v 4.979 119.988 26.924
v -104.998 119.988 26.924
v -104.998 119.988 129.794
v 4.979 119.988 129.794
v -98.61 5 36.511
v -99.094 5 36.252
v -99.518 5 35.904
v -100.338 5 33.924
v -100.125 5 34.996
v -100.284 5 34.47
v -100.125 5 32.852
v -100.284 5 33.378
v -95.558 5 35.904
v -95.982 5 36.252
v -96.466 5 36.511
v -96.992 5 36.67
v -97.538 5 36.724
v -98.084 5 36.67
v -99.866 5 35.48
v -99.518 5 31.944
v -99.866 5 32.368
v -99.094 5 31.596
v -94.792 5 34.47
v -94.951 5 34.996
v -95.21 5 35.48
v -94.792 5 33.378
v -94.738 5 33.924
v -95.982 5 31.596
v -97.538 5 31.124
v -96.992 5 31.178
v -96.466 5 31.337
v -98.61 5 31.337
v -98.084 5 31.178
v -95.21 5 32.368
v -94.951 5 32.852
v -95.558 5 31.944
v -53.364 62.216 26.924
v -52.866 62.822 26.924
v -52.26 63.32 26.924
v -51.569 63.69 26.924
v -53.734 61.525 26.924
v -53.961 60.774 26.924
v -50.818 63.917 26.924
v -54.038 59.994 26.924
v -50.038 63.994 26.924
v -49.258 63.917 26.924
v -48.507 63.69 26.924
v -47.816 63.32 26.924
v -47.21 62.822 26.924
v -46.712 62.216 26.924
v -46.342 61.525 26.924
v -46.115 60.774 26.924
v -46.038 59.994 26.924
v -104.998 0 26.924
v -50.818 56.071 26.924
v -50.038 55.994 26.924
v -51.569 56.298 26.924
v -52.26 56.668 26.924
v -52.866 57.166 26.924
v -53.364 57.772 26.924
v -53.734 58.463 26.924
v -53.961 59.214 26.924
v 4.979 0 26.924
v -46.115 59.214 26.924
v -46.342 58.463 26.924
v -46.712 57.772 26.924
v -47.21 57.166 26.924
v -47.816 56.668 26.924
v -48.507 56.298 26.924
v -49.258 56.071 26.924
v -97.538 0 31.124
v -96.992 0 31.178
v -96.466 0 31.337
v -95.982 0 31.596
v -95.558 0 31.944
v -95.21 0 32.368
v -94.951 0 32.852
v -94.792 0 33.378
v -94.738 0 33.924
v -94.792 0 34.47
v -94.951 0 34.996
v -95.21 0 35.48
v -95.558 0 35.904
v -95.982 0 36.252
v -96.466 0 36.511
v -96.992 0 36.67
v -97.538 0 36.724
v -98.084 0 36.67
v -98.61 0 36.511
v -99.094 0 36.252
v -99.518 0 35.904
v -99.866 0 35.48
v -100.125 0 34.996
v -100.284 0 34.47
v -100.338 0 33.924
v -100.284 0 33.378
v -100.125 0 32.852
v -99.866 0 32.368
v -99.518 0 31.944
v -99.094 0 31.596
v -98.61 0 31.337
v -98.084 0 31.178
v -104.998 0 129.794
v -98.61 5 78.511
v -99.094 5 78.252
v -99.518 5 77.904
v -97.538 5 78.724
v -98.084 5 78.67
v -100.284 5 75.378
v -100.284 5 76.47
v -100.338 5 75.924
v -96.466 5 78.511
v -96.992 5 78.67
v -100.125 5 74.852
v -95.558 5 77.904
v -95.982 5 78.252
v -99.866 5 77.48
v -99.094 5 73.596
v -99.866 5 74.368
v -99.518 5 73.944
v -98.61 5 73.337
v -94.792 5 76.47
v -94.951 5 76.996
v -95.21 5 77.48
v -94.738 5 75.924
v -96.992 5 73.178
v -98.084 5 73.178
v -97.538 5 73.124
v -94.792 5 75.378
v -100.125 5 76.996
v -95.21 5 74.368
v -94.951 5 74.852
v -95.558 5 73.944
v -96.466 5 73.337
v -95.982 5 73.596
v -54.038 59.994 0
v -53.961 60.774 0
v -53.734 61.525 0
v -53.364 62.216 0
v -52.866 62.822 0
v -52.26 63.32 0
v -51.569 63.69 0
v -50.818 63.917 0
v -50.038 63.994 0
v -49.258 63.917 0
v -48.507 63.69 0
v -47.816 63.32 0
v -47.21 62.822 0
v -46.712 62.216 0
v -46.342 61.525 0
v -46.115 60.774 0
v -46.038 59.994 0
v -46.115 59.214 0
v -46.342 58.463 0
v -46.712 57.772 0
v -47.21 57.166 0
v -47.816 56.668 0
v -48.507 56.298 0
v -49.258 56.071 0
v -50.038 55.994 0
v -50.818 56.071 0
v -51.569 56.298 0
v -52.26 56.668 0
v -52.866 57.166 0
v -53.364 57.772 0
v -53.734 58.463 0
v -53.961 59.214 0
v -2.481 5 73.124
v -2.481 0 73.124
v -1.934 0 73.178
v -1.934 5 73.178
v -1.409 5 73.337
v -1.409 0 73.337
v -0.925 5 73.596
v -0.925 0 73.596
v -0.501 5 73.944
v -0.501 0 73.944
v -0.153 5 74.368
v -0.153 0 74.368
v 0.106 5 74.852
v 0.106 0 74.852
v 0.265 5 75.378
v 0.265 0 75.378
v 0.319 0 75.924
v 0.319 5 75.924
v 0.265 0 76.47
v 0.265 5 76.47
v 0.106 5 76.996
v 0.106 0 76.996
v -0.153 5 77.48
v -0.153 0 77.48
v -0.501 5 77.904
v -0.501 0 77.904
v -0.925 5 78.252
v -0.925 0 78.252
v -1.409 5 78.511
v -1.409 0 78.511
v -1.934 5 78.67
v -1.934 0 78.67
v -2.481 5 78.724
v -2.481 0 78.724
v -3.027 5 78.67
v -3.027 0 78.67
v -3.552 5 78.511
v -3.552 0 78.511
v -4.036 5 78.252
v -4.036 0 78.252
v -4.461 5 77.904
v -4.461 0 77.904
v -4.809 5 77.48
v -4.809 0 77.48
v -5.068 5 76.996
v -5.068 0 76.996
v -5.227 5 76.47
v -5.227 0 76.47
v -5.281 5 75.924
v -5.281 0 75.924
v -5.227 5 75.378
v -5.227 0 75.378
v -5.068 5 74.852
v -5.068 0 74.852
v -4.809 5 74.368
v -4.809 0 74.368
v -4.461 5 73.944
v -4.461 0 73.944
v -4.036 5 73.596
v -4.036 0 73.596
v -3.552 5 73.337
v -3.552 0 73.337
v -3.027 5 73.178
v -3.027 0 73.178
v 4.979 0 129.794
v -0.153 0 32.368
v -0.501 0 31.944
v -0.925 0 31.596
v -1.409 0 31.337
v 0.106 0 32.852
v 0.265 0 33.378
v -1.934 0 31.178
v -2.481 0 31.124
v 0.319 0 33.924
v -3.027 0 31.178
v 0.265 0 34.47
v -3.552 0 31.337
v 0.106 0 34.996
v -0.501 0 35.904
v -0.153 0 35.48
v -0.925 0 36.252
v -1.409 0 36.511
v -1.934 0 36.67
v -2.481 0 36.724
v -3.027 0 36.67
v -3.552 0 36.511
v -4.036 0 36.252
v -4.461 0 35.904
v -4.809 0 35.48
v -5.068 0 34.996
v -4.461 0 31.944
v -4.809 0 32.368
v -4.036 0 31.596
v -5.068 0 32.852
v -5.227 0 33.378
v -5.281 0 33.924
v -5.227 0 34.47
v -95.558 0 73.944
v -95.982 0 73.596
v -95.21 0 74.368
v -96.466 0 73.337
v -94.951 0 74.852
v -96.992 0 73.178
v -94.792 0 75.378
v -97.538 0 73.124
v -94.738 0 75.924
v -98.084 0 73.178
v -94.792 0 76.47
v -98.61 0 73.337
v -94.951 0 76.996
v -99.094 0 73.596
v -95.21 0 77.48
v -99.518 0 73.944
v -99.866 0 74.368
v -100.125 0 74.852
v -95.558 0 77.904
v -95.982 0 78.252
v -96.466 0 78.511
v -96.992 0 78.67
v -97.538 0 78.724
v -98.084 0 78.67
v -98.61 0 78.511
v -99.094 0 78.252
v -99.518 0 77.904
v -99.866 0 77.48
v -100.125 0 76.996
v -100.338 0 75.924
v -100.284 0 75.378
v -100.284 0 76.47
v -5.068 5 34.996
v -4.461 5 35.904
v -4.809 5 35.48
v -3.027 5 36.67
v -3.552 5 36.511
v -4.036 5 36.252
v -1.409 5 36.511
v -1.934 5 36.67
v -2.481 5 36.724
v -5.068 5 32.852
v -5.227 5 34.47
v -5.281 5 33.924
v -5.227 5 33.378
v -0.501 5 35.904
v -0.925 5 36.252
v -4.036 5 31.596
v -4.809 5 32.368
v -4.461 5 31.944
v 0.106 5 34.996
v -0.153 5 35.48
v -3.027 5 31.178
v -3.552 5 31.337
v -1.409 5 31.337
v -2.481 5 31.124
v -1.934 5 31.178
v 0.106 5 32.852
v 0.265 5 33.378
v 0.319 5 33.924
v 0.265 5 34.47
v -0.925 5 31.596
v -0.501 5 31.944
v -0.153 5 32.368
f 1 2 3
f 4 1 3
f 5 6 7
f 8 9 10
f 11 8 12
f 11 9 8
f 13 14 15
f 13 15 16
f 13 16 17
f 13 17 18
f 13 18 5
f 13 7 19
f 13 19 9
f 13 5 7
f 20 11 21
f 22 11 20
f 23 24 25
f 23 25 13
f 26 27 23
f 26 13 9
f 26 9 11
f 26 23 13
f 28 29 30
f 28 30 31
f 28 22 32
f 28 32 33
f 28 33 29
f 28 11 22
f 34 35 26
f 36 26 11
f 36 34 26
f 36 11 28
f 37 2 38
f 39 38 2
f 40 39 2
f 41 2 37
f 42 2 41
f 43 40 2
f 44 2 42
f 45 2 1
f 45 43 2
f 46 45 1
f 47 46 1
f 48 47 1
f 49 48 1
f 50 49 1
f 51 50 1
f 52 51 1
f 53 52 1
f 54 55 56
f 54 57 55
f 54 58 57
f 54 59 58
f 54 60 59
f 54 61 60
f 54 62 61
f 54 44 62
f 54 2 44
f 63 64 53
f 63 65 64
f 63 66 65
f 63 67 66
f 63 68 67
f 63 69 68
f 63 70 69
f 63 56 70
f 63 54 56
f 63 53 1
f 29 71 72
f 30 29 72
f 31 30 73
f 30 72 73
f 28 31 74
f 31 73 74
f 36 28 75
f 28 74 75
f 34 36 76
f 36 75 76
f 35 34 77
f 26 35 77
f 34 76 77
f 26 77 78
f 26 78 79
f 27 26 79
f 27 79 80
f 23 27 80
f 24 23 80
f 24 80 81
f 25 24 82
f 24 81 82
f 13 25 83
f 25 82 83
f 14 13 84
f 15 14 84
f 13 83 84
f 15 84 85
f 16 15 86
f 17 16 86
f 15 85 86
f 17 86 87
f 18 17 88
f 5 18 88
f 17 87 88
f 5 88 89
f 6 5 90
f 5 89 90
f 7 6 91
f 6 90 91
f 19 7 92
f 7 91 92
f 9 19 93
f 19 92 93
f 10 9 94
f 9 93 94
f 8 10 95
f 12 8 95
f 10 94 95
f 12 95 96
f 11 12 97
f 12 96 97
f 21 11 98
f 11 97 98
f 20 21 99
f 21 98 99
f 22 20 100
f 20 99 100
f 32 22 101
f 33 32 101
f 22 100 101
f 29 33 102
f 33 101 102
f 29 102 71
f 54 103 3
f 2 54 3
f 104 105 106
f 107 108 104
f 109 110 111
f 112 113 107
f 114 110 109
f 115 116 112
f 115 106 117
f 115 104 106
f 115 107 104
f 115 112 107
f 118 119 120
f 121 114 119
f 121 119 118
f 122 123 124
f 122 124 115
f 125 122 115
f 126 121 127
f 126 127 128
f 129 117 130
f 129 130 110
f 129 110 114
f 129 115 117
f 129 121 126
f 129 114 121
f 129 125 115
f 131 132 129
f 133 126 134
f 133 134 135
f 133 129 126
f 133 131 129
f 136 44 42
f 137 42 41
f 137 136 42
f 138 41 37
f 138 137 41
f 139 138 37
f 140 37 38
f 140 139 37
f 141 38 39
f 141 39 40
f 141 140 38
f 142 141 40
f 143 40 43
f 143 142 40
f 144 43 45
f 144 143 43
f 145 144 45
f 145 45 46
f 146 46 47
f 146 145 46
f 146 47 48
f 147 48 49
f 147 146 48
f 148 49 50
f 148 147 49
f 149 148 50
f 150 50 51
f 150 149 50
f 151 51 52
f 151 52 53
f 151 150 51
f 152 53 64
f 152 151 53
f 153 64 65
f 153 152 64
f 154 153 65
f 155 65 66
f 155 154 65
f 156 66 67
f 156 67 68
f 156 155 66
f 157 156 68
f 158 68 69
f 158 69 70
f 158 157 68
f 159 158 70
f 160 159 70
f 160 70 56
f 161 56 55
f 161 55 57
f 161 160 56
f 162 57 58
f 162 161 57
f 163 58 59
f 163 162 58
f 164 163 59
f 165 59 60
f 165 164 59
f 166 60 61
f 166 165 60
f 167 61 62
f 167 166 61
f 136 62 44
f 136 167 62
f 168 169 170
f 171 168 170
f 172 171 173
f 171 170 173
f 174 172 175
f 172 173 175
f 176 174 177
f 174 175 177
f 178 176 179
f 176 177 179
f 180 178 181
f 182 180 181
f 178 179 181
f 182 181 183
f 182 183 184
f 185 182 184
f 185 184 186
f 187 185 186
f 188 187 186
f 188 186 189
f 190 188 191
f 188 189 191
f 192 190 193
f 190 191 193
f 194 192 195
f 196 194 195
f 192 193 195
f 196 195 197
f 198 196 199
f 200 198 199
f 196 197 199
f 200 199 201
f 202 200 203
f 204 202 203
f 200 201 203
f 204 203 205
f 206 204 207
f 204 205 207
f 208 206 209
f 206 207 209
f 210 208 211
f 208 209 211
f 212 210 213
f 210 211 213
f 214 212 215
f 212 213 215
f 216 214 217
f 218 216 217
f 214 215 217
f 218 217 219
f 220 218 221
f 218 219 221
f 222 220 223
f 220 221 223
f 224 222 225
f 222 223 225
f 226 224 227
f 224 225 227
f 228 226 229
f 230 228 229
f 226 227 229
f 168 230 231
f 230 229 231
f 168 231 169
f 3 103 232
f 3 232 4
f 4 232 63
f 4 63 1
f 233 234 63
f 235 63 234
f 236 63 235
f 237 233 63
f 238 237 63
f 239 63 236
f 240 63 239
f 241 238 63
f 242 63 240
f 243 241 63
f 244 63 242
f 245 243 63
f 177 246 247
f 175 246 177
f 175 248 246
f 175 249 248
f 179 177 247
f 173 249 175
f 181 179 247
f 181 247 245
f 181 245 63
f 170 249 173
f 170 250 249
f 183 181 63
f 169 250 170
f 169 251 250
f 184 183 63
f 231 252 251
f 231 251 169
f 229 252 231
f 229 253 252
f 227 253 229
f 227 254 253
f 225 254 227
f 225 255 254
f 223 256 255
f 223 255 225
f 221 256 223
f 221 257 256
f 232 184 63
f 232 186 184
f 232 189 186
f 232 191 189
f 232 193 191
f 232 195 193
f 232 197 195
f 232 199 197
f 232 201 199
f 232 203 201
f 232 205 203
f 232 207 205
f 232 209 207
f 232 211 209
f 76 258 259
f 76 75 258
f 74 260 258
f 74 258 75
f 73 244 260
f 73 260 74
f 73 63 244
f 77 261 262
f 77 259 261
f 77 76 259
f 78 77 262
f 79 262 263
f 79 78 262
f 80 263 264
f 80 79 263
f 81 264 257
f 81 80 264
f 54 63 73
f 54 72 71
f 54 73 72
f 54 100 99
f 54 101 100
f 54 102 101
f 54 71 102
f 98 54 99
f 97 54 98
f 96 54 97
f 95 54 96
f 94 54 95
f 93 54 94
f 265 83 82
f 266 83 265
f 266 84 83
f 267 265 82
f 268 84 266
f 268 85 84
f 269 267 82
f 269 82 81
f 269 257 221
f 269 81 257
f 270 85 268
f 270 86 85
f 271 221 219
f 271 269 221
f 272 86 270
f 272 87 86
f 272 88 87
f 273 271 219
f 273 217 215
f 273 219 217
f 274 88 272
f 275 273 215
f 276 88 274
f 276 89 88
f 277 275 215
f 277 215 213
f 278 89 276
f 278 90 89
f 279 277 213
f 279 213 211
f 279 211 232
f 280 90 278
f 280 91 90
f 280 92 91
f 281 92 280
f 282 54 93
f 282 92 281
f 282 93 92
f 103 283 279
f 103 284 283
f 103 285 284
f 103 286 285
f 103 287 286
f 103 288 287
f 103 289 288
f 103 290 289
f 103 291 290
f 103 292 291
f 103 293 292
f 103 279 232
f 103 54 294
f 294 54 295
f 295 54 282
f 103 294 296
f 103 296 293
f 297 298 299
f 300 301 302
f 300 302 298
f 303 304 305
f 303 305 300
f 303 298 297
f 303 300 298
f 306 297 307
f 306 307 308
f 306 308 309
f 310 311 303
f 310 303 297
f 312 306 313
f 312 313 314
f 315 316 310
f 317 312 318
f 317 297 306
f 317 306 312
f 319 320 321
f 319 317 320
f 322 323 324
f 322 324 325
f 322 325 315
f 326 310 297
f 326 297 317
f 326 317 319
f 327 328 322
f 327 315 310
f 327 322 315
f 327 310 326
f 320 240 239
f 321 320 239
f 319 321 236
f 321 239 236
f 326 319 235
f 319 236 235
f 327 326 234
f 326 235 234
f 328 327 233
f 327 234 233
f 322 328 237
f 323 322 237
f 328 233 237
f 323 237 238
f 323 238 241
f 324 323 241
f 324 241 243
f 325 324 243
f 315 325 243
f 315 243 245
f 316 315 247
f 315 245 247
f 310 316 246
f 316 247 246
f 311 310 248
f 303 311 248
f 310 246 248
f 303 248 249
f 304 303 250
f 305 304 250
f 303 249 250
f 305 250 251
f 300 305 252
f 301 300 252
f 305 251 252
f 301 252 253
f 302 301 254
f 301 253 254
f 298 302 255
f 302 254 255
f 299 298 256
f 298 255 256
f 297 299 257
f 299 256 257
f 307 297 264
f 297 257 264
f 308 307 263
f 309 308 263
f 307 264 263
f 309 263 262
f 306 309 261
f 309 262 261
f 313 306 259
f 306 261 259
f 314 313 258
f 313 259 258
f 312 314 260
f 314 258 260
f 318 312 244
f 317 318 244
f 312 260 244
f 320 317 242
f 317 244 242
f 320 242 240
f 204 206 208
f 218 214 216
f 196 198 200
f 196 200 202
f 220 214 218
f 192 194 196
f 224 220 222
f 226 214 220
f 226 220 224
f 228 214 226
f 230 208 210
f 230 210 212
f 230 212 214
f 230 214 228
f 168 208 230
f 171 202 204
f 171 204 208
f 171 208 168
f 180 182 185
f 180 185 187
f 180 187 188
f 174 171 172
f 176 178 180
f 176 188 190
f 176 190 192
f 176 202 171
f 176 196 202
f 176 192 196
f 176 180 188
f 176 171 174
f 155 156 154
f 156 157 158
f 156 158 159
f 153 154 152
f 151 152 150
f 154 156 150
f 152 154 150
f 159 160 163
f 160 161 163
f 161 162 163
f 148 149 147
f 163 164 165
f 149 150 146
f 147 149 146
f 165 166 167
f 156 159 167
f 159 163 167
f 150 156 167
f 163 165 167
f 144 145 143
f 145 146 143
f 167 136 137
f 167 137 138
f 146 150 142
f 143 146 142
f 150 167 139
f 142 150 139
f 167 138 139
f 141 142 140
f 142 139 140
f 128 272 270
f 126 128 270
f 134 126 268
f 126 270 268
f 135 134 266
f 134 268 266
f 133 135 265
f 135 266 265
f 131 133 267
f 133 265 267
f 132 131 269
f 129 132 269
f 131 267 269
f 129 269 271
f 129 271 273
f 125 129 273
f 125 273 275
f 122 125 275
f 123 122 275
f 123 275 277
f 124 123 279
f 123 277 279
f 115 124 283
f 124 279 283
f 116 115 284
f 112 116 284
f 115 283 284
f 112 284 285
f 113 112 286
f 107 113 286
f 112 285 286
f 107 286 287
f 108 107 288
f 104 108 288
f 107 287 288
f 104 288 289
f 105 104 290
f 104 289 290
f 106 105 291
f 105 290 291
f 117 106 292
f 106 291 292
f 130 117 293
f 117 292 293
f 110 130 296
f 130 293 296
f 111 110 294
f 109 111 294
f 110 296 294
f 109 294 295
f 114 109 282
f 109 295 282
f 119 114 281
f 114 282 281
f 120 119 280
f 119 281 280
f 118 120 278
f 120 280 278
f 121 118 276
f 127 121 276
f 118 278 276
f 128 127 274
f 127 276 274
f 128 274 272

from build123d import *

# Parameters (mm, degrees)
BOSS_EXTRUDE1_DEPTH      = 4.978866735
BOSS_EXTRUDE1_DEPTH_BACK = 104.997590598
SKETCH1_W                = 119.988
SKETCH1_H                = 129.794
SKETCH3_OUTSIDE_W        = 153.613
SKETCH3_OUTSIDE_H        = 163.624
SKETCH3_OUTSIDE_R        = 4
CUT_EXTRUDE1_DEPTH       = 26.924
SKETCH4_R                = 2.8
CUT_EXTRUDE2_DEPTH       = 5


with BuildPart() as part:
    # Sketch1 → Boss-Extrude1 (new, two sides: drawn at the far end of the back side and taken through both)
    with BuildSketch(Plane.YZ.offset(-BOSS_EXTRUDE1_DEPTH_BACK)):
        with Locations((59.994, 64.897)):
            Rectangle(SKETCH1_W, SKETCH1_H)
    extrude(amount=BOSS_EXTRUDE1_DEPTH + BOSS_EXTRUDE1_DEPTH_BACK)

    # Sketch3 outside → Cut-Extrude1 (cut)
    with BuildSketch(Plane(origin=(0, 0, 0), x_dir=(1, 0, 0), z_dir=(0, 0, -1))):
        with Locations((-50.0095, -59.994)):
            Rectangle(SKETCH3_OUTSIDE_W, SKETCH3_OUTSIDE_H)
        with Locations(Location((-50.038, -59.994, 0), (0, 0, 180))):
            Circle(SKETCH3_OUTSIDE_R, mode=Mode.SUBTRACT)
    extrude(amount=-CUT_EXTRUDE1_DEPTH, mode=Mode.SUBTRACT)

    # Sketch4 → Cut-Extrude2 (cut)
    with BuildSketch(Plane.XZ):
        with Locations(Location((-97.538, 33.924, 0), (0, 0, 270))):
            Circle(SKETCH4_R)
        with Locations(Location((-97.538, 75.924, 0), (0, 0, 270))):
            Circle(SKETCH4_R)
        with Locations(Location((-2.480723862, 75.924, 0), (0, 0, 270))):
            Circle(SKETCH4_R)
        with Locations(Location((-2.480723862, 33.924, 0), (0, 0, 270))):
            Circle(SKETCH4_R)
    extrude(amount=-CUT_EXTRUDE2_DEPTH, mode=Mode.SUBTRACT)


solid = part.part
